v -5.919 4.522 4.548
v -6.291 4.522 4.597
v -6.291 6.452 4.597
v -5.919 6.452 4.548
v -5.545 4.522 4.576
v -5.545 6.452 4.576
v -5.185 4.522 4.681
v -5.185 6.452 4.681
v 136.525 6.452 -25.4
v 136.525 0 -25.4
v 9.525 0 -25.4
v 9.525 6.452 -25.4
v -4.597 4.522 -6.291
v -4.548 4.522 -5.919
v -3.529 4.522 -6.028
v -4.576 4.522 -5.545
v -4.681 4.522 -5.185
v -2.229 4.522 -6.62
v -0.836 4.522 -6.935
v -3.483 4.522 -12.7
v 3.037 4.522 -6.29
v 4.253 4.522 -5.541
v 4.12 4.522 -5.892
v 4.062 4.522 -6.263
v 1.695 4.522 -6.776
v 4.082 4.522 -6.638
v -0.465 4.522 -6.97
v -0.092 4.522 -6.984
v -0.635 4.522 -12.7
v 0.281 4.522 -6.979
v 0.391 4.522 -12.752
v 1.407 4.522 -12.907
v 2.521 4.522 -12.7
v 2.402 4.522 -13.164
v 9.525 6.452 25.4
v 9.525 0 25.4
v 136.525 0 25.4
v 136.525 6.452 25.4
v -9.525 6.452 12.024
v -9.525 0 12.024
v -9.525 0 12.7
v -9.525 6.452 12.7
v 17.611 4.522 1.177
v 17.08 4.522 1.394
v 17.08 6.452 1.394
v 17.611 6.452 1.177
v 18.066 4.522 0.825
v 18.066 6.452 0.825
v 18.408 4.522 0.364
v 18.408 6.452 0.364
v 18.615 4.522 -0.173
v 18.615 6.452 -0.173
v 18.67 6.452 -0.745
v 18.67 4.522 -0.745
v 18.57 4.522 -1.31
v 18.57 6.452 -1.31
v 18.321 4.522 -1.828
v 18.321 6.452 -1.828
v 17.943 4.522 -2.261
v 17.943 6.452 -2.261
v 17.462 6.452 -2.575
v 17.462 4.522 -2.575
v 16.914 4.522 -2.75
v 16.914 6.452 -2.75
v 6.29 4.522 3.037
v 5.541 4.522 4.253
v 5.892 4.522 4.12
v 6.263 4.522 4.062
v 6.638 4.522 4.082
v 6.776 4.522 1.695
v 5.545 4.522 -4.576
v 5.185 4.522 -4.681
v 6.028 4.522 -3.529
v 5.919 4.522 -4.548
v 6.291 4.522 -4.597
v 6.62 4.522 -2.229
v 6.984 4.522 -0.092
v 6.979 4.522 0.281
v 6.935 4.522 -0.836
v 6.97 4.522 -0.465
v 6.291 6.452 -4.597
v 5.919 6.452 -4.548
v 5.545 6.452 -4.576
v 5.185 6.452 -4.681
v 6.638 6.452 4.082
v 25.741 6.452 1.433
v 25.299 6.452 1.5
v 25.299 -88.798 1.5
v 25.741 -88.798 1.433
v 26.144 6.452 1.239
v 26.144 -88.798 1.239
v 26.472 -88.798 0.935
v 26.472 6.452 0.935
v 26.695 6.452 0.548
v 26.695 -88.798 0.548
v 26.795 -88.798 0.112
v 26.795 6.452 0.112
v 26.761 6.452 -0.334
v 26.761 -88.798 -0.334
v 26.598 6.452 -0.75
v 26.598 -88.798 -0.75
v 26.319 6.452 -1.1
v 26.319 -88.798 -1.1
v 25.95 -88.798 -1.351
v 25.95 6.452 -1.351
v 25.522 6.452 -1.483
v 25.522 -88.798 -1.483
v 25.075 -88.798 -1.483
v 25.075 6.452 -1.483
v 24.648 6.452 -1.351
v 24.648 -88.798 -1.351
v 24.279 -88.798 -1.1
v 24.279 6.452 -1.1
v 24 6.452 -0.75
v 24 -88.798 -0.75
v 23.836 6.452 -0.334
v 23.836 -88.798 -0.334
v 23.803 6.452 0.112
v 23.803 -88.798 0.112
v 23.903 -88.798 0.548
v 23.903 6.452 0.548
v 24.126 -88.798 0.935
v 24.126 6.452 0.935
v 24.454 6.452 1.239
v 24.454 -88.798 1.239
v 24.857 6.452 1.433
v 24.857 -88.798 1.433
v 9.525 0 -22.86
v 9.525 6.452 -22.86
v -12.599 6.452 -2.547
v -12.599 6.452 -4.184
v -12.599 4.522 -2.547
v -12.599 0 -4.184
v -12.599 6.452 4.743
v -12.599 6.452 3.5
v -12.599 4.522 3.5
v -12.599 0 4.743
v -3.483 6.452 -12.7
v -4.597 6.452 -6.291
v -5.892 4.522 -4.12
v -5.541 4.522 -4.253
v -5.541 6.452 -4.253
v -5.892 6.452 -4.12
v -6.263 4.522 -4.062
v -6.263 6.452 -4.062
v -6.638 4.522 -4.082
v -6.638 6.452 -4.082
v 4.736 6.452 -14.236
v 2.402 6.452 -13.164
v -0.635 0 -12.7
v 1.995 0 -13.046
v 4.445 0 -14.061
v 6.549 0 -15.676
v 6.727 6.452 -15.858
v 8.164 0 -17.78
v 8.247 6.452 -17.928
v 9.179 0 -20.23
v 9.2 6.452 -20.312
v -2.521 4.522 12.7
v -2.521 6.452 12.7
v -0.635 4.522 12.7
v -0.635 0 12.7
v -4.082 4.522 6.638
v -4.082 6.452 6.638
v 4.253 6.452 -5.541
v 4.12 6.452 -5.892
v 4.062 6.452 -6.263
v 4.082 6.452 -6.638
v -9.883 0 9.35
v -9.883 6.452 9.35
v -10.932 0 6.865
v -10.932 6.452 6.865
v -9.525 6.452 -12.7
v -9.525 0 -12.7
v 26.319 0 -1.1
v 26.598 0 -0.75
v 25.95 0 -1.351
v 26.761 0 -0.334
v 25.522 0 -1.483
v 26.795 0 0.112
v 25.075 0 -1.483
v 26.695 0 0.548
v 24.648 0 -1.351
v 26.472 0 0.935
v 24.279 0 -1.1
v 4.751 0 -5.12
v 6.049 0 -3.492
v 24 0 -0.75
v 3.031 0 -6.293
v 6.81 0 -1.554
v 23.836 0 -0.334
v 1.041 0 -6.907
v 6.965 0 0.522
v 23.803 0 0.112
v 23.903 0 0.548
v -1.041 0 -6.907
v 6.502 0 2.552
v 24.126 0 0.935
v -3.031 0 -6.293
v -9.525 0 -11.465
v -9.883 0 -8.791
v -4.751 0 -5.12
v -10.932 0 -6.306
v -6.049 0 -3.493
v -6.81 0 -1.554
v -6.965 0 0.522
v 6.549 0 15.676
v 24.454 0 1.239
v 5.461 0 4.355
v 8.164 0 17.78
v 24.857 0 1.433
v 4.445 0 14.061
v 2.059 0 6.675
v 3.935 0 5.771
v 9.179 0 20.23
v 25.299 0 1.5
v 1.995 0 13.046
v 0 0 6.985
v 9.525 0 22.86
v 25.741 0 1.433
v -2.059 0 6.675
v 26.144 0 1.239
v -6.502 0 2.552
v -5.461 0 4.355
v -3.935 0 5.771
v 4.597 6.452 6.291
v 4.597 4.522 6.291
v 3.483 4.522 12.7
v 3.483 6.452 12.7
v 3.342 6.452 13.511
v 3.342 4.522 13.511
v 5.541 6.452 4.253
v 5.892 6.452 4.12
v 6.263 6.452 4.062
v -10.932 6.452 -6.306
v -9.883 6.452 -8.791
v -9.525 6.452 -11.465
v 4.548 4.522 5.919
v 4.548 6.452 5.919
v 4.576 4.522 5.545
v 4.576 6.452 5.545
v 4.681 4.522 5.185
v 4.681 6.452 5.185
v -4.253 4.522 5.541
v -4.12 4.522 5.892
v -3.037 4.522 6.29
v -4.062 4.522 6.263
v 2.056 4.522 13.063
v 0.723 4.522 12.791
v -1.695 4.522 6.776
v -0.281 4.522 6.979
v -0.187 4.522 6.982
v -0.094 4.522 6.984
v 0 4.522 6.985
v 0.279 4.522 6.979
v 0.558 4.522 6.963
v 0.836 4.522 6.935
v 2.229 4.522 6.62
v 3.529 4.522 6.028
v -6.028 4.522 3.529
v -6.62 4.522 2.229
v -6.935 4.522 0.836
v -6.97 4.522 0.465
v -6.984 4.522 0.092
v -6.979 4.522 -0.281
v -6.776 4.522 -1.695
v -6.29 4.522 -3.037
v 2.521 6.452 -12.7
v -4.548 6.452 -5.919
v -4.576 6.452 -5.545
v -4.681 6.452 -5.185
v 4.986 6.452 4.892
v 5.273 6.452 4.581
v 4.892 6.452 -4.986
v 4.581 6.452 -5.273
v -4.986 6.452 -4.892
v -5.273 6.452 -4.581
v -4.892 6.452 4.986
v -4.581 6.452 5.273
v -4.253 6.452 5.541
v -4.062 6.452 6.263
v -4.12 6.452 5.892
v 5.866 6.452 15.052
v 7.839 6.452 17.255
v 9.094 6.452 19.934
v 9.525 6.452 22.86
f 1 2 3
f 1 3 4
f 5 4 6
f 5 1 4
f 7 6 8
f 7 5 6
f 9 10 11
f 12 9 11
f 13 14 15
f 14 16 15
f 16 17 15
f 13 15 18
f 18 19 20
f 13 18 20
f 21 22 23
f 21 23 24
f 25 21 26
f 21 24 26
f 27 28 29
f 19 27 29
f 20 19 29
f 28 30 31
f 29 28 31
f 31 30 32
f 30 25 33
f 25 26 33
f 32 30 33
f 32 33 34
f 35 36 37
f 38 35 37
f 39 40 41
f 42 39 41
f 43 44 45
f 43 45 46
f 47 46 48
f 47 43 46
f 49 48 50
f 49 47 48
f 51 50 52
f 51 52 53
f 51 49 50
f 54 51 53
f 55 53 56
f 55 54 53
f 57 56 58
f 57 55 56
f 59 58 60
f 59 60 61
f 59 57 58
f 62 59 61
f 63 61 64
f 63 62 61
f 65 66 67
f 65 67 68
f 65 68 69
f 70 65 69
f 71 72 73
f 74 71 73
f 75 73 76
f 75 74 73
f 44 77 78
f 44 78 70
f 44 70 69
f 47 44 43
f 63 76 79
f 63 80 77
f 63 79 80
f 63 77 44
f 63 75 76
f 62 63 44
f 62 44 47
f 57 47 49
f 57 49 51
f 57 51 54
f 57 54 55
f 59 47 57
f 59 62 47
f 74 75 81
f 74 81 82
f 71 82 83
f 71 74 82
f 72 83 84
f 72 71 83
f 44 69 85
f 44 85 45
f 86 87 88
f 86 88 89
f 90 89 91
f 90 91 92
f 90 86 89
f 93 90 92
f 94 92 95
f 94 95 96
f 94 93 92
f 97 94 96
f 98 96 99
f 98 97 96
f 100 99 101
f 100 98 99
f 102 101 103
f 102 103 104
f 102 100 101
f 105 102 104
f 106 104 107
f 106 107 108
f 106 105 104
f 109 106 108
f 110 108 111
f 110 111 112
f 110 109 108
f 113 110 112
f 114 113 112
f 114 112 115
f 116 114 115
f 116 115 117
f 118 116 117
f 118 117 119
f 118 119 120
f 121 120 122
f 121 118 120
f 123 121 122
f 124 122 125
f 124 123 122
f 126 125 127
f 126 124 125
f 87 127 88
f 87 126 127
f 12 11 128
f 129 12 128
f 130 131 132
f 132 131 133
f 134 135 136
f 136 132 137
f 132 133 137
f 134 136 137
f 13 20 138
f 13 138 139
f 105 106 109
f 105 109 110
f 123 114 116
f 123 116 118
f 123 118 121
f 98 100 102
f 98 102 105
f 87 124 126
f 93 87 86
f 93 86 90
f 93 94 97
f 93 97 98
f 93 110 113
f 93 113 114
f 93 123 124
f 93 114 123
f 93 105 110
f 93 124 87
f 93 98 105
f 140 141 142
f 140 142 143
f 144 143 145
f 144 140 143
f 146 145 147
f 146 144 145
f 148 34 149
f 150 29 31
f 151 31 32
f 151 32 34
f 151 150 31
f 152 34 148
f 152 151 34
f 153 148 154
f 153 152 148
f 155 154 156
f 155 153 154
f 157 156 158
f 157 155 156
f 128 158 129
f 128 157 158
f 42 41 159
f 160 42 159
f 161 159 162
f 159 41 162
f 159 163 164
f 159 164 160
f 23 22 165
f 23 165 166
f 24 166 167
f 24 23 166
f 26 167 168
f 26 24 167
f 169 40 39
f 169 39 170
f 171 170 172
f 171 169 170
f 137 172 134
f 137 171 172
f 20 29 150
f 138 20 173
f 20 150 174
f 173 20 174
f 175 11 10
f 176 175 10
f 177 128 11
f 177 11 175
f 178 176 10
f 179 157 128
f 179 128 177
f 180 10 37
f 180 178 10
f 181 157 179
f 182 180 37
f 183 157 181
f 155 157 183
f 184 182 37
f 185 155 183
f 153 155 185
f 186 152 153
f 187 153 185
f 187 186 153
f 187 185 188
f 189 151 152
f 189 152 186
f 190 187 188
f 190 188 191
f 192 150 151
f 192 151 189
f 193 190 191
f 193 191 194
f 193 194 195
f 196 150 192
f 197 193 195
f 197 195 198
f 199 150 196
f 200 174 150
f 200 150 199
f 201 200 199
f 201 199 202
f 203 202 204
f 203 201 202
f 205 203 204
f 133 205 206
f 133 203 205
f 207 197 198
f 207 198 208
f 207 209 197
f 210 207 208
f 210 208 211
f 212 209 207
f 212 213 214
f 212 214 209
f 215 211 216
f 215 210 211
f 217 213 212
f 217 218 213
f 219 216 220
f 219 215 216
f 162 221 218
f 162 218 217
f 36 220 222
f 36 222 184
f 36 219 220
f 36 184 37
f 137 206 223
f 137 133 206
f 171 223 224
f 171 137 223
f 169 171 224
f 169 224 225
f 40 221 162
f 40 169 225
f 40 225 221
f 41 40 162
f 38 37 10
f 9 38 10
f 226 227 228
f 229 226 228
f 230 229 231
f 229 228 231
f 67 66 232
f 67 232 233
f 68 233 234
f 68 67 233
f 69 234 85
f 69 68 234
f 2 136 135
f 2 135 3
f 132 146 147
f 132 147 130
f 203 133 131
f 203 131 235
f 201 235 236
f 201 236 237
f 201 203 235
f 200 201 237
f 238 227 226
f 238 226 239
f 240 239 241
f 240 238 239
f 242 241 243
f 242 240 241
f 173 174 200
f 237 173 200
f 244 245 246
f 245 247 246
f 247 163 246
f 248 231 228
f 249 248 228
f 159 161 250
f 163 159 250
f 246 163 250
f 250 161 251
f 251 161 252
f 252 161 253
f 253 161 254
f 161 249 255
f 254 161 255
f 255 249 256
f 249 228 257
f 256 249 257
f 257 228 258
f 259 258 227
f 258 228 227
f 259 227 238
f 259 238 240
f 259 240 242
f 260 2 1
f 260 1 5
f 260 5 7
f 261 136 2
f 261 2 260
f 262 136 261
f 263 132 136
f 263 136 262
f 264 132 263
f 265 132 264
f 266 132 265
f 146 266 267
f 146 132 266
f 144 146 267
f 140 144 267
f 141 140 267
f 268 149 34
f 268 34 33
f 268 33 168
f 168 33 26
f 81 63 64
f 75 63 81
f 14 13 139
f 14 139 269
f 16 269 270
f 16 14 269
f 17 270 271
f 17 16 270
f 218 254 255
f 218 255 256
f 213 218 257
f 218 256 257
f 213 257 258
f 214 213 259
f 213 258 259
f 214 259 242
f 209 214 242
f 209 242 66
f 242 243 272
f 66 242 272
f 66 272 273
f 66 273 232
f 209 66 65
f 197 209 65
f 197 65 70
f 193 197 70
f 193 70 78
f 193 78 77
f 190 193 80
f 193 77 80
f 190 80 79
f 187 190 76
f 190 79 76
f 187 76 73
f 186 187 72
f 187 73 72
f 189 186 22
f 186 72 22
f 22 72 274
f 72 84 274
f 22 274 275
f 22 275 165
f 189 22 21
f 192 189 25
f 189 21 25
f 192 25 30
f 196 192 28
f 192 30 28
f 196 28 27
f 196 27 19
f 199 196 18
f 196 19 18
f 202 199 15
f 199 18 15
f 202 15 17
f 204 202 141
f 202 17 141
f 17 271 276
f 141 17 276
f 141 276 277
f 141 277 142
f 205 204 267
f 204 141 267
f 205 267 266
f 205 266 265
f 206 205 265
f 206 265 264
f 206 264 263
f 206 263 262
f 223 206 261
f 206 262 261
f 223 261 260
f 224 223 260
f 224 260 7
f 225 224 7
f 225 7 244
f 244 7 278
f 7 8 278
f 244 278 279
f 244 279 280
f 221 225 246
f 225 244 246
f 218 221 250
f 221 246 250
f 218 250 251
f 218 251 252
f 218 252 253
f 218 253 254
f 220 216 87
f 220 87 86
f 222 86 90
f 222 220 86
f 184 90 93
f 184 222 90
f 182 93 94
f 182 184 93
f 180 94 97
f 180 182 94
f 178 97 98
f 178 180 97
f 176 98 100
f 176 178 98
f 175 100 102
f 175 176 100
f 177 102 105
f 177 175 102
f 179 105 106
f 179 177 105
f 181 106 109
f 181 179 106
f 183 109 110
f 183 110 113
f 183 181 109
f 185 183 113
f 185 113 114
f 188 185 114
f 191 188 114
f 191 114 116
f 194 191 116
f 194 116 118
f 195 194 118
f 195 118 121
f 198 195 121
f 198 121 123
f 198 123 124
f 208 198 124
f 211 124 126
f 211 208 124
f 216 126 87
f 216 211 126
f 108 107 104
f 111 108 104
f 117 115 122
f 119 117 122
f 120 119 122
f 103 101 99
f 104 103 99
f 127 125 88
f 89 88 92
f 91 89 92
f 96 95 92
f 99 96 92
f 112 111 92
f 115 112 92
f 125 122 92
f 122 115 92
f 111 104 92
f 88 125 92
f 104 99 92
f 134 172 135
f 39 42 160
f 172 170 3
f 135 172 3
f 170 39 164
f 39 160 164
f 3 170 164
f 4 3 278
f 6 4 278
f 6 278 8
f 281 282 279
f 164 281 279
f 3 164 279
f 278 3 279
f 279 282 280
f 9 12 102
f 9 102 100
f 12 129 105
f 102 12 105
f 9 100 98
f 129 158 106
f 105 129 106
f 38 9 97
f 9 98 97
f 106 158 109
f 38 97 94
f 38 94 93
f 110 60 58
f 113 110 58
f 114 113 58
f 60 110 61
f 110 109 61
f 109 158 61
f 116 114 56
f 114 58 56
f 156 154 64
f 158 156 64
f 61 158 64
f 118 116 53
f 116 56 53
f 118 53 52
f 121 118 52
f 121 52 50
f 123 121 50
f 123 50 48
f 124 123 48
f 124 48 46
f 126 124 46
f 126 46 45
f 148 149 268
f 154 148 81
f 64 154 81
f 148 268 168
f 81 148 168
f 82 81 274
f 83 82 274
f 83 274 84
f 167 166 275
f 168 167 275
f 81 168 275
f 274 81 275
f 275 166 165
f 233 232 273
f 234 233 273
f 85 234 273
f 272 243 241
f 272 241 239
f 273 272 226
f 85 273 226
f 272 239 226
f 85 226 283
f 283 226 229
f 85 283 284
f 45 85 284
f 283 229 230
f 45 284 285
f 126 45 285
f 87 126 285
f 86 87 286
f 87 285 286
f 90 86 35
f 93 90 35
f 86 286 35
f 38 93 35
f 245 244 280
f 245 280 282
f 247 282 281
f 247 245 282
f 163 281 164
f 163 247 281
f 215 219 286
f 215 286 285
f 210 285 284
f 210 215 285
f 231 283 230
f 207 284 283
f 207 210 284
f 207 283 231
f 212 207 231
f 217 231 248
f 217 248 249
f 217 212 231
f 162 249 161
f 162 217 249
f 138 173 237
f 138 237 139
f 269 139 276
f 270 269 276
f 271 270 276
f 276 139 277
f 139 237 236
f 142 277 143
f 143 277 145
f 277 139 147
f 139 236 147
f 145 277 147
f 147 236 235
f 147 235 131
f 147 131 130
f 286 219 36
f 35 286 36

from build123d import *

# Parameters (mm, degrees)
SKETCH1_R           = 1.5
BOSS_EXTRUDE1_DEPTH = 6.4516
SKETCH2_3_R         = 6.985
CUT_EXTRUDE2_DEPTH  = 19.97964
CAVITY1_START       = 4.521642996
CAVITY1_OUTLINE_R   = 0.7575
CAVITY1_DEPTH       = 1.929957004
SKETCH3_R           = 0.7575
CUT_EXTRUDE3_DEPTH  = 139.94128573
SKETCH4_R           = 1.5
BOSS_EXTRUDE2_DEPTH = 95.25
FILLET1_R           = 10.16


with BuildPart() as part:
    # Sketch1 → Boss-Extrude1 (new body)
    with BuildSketch(Plane(origin=(0, 0, 0), x_dir=(1, 0, 0), z_dir=(0, 1, 0))):
        Polygon((-12.598868717, 4.18434255), (-12.598868717, -4.742883604), (-9.525, -5.534097084), (-9.525, -12.7), (9.525, -12.7), (9.525, -25.4), (136.525, -25.4), (136.525, 25.4), (9.525, 25.4), (9.525, 12.7), (-9.525, 12.7), (-9.525, 4.975556031), align=None)
        with Locations(Location((25.298868717, 0, 0), (0, 0, 270))):
            Circle(SKETCH1_R, mode=Mode.SUBTRACT)
    extrude(amount=BOSS_EXTRUDE1_DEPTH)

    # Sketch2<3> → Cut-Extrude2 (cut)
    with BuildSketch(Plane(origin=(0, 6.4516, 0), x_dir=(1, 0, 0), z_dir=(0, 1, 0))):
        with Locations(Location((0, 0, 0), (0, 0, 270))):
            Circle(SKETCH2_3_R)
    extrude(amount=-CUT_EXTRUDE2_DEPTH, mode=Mode.SUBTRACT)

    # Cavity1: read off the stored shape, not the designer's step
    # Cavity1 outline → Cavity1 (cut)
    # profile 1 of 4: a face of its own
    with BuildSketch(Plane(origin=(0, 0, 0), x_dir=(1, 0, 0), z_dir=(0, 1, 0)).offset(CAVITY1_START)):
        with BuildLine():
            ThreePointArc((-0.835841276, 6.934810333), (-0.328024221, 8.224961542), (0.280923041, 6.979348626))
            ThreePointArc((0.280923041, 6.979348626), (2.378348231, 6.567623976), (4.253065237, 5.540907966))
            ThreePointArc((4.253065237, 5.540907966), (4.081154126, 6.075770836), (4.081735433, 6.637581642))
            Line((4.081735433, 6.637581642), (2.521269592, 12.7))
            Line((2.521269592, 12.7), (-3.482705917, 12.7))
            Line((-3.482705917, 12.7), (-4.59736509, 6.291445655))
            ThreePointArc((-4.59736509, 6.291445655), (-4.552045019, 5.731465467), (-4.680815563, 5.184610947))
            ThreePointArc((-4.680815563, 5.184610947), (-2.893816709, 6.357361863), (-0.835841276, 6.934810333))
        make_face()
        with Locations((-0.418583054, 10.495656446)):
            Circle(CAVITY1_OUTLINE_R, mode=Mode.SUBTRACT)
    # profile 2 of 4: a face of its own
    with BuildSketch(Plane(origin=(0, 0, 0), x_dir=(1, 0, 0), z_dir=(0, 1, 0)).offset(CAVITY1_START)):
        with BuildLine():
            ThreePointArc((6.291445655, 4.59736509), (5.731465467, 4.552045019), (5.184610947, 4.680815563))
            ThreePointArc((5.184610947, 4.680815563), (6.357361863, 2.893816709), (6.934810333, 0.835841276))
            ThreePointArc((6.934810333, 0.835841276), (8.224961542, 0.328024221), (6.979348626, -0.280923041))
            ThreePointArc((6.979348626, -0.280923041), (6.567623976, -2.378348231), (5.540907966, -4.253065237))
            ThreePointArc((5.540907966, -4.253065237), (6.075770836, -4.081154126), (6.637581642, -4.081735433))
            Line((6.637581642, -4.081735433), (17.079554107, -1.39397283))
            ThreePointArc((17.079554107, -1.39397283), (18.670158101, 0.744594857), (16.914297994, 2.749700365))
            Line((16.914297994, 2.749700365), (6.291445655, 4.59736509))
        make_face()
        with Locations((10.495656446, 0.418583054)):
            Circle(CAVITY1_OUTLINE_R, mode=Mode.SUBTRACT)
        with Locations((13.523249651, 0.539328166)):
            Circle(CAVITY1_OUTLINE_R, mode=Mode.SUBTRACT)
        with Locations((16.550842857, 0.660073278)):
            Circle(CAVITY1_OUTLINE_R, mode=Mode.SUBTRACT)
    # profile 3 of 4: a face of its own
    with BuildSketch(Plane(origin=(0, 0, 0), x_dir=(1, 0, 0), z_dir=(0, 1, 0)).offset(CAVITY1_START)):
        with BuildLine():
            ThreePointArc((-6.979348626, 0.280923041), (-6.567623976, 2.378348231), (-5.540907966, 4.253065237))
            ThreePointArc((-5.540907966, 4.253065237), (-6.075770836, 4.081154126), (-6.637581642, 4.081735433))
            Line((-6.637581642, 4.081735433), (-12.598868717, 2.547300773))
            Line((-12.598868717, 2.547300773), (-12.598868717, -3.500295986))
            Line((-12.598868717, -3.500295986), (-6.291445655, -4.59736509))
            ThreePointArc((-6.291445655, -4.59736509), (-5.731465467, -4.552045019), (-5.184610947, -4.680815563))
            ThreePointArc((-5.184610947, -4.680815563), (-6.357361863, -2.893816709), (-6.934810333, -0.835841276))
            ThreePointArc((-6.934810333, -0.835841276), (-8.224961542, -0.328024221), (-6.979348626, 0.280923041))
        make_face()
        with Locations((-10.495656446, -0.418583054)):
            Circle(CAVITY1_OUTLINE_R, mode=Mode.SUBTRACT)
    # profile 4 of 4: a face of its own
    with BuildSketch(Plane(origin=(0, 0, 0), x_dir=(1, 0, 0), z_dir=(0, 1, 0)).offset(CAVITY1_START)):
        with BuildLine():
            ThreePointArc((4.59736509, -6.291445655), (4.552045019, -5.731465467), (4.680815563, -5.184610947))
            ThreePointArc((4.680815563, -5.184610947), (2.893816709, -6.357361863), (0.835841276, -6.934810333))
            ThreePointArc((0.835841276, -6.934810333), (0.328024221, -8.224961542), (-0.280923041, -6.979348626))
            ThreePointArc((-0.280923041, -6.979348626), (-2.378348231, -6.567623976), (-4.253065237, -5.540907966))
            ThreePointArc((-4.253065237, -5.540907966), (-4.081154126, -6.075770836), (-4.081735433, -6.637581642))
            Line((-4.081735433, -6.637581642), (-2.521269592, -12.7))
            Line((-2.521269592, -12.7), (3.482705917, -12.7))
            Line((3.482705917, -12.7), (4.59736509, -6.291445655))
        make_face()
        with Locations((0.418583054, -10.495656446)):
            Circle(CAVITY1_OUTLINE_R, mode=Mode.SUBTRACT)
    extrude(amount=CAVITY1_DEPTH, mode=Mode.SUBTRACT)

    # Sketch3 → Cut-Extrude3 (cut, through all)
    with BuildSketch(Plane(origin=(0, 4.521642996, 0), x_dir=(1, 0, 0), z_dir=(0, 1, 0))):
        with Locations((0.418583054, -10.495656446)):
            Circle(SKETCH3_R)
        with Locations((16.550842857, 0.660073278)):
            Circle(SKETCH3_R)
        with Locations((13.523249651, 0.539328166)):
            Circle(SKETCH3_R)
        with Locations((10.495656446, 0.418583054)):
            Circle(SKETCH3_R)
        with Locations((-0.418583054, 10.495656446)):
            Circle(SKETCH3_R)
        with Locations((-10.495656446, -0.418583054)):
            Circle(SKETCH3_R)
        with BuildLine():
            Line((-6.979348626, 0.280923041), (-6.934810333, -0.835841276))
            ThreePointArc((-6.934810333, -0.835841276), (-8.224961542, -0.32802422), (-6.979348626, 0.280923041))
        make_face()
        with BuildLine():
            Line((-0.835841276, 6.934810333), (0.280923041, 6.979348626))
            ThreePointArc((0.280923041, 6.979348626), (-0.32802422, 8.224961542), (-0.835841276, 6.934810333))
        make_face()
        with BuildLine():
            Line((6.934810333, 0.835841276), (6.979348626, -0.280923041))
            ThreePointArc((6.979348626, -0.280923041), (8.224961542, 0.32802422), (6.934810333, 0.835841276))
        make_face()
        with BuildLine():
            Line((-0.280923041, -6.979348626), (0.835841276, -6.934810333))
            ThreePointArc((0.835841276, -6.934810333), (0.32802422, -8.224961542), (-0.280923041, -6.979348626))
        make_face()
    extrude(amount=CUT_EXTRUDE3_DEPTH, mode=Mode.SUBTRACT)

    # Fillet1
    # the kernel refuses this fillet: 10.16 mm, written as the material it adds along each edge
    with BuildSketch(Plane(origin=(-9.525, 0, -4.975556031), x_dir=(0, 0, -1), z_dir=(0, 1, 0))) as fillet1_piece_1:
        with BuildLine():
            CenterArc((6.48974411, 10.16), FILLET1_R, 224.223082624, 45.776917376)
            Line((-0.791213481, 3.073868717), (0, 0))
            Line((0, 0), (6.48974411, 0))
        make_face()
    extrude(amount=6.4516)
    with BuildSketch(Plane(origin=(-9.525, 0, 5.534097084), x_dir=(0, 0, 1), z_dir=(0, 1, 0))) as fillet1_piece_2:
        with BuildLine():
            CenterArc((6.48974411, -10.16), FILLET1_R, 90, 45.776917376)
            Line((-0.791213481, -3.073868717), (0, 0))
            Line((0, 0), (6.48974411, 0))
        make_face()
    extrude(amount=6.4516)
    with BuildSketch(Plane(origin=(9.525, 0, 12.7), x_dir=(0, 0, 1), z_dir=(0, 1, 0))) as fillet1_piece_3_section:
        with BuildLine():
            CenterArc((FILLET1_R, -FILLET1_R), FILLET1_R, 90, 90)
            Line((0, -FILLET1_R), (0, 0))
            Line((0, 0), (FILLET1_R, 0))
        make_face()
    fillet1_piece_3 = extrude(amount=6.4516, mode=Mode.PRIVATE)
    fillet1_piece_3 = split(fillet1_piece_3, bisect_by=Plane(origin=(3.660133912, 0, 11.679906164), z_dir=(0.9852084333186758, 0, 0.17136027228549955)), keep=Keep.TOP, mode=Mode.PRIVATE)
    fillet1_piece_3 = split(fillet1_piece_3, bisect_by=Plane(origin=(9.525, 4.521642996, 12.7), z_dir=(0, -1, 0)), keep=Keep.TOP, mode=Mode.PRIVATE)
    add(fillet1_piece_3)
    with BuildSketch(Plane(origin=(9.525, 0, 12.7), x_dir=(0, 0, 1), z_dir=(0, 1, 0))) as fillet1_piece_4_section:
        with BuildLine():
            CenterArc((FILLET1_R, -FILLET1_R), FILLET1_R, 90, 90)
            Line((0, -FILLET1_R), (0, 0))
            Line((0, 0), (FILLET1_R, 0))
        make_face()
    fillet1_piece_4 = extrude(amount=6.4516, mode=Mode.PRIVATE)
    fillet1_piece_4 = split(fillet1_piece_4, bisect_by=Plane(origin=(3.660133912, 0, 11.679906164), z_dir=(-0.9852084333186758, 0, -0.17136027228549955)), keep=Keep.TOP, mode=Mode.PRIVATE)
    fillet1_piece_4 = split(fillet1_piece_4, bisect_by=Plane(origin=(9.525, 4.521642996, 12.7), z_dir=(0, -1, 0)), keep=Keep.TOP, mode=Mode.PRIVATE)
    add(fillet1_piece_4)
    with BuildSketch(Plane(origin=(9.525, 0, 12.7), x_dir=(0, 0, 1), z_dir=(0, 1, 0))) as fillet1_piece_5_section:
        with BuildLine():
            CenterArc((FILLET1_R, -FILLET1_R), FILLET1_R, 90, 90)
            Line((0, -FILLET1_R), (0, 0))
            Line((0, 0), (FILLET1_R, 0))
        make_face()
    fillet1_piece_5 = extrude(amount=6.4516, mode=Mode.PRIVATE)
    fillet1_piece_5 = split(fillet1_piece_5, bisect_by=Plane(origin=(3.660133912, 0, 11.679906164), z_dir=(0.9852084333186758, 0, 0.17136027228549955)), keep=Keep.TOP, mode=Mode.PRIVATE)
    fillet1_piece_5 = split(fillet1_piece_5, bisect_by=Plane(origin=(9.525, 4.521642996, 12.7), z_dir=(0, 1, 0)), keep=Keep.TOP, mode=Mode.PRIVATE)
    add(fillet1_piece_5)
    with BuildSketch(Plane(origin=(9.525, 0, -12.7), x_dir=(0, 0, -1), z_dir=(0, 1, 0))) as fillet1_piece_6_section:
        with BuildLine():
            CenterArc((FILLET1_R, FILLET1_R), FILLET1_R, 180, 90)
            Line((0, FILLET1_R), (0, 0))
            Line((0, 0), (FILLET1_R, 0))
        make_face()
    fillet1_piece_6 = extrude(amount=6.4516, mode=Mode.PRIVATE)
    fillet1_piece_6 = split(fillet1_piece_6, bisect_by=Plane(origin=(9.525, 4.521642996, -12.7), z_dir=(0, -1, 0)), keep=Keep.TOP, mode=Mode.PRIVATE)
    fillet1_piece_6 = split(fillet1_piece_6, bisect_by=Plane(origin=(2.956465884, 0, -11.009260017), z_dir=(0.9684328656786102, 0, -0.24927451669497816)), keep=Keep.TOP, mode=Mode.PRIVATE)
    add(fillet1_piece_6)
    with BuildSketch(Plane(origin=(9.525, 0, -12.7), x_dir=(0, 0, -1), z_dir=(0, 1, 0))) as fillet1_piece_7_section:
        with BuildLine():
            CenterArc((FILLET1_R, FILLET1_R), FILLET1_R, 180, 90)
            Line((0, FILLET1_R), (0, 0))
            Line((0, 0), (FILLET1_R, 0))
        make_face()
    fillet1_piece_7 = extrude(amount=6.4516, mode=Mode.PRIVATE)
    fillet1_piece_7 = split(fillet1_piece_7, bisect_by=Plane(origin=(9.525, 4.521642996, -12.7), z_dir=(0, -1, 0)), keep=Keep.TOP, mode=Mode.PRIVATE)
    fillet1_piece_7 = split(fillet1_piece_7, bisect_by=Plane(origin=(2.956465884, 0, -11.009260017), z_dir=(-0.9684328656786102, 0, 0.24927451669497816)), keep=Keep.TOP, mode=Mode.PRIVATE)
    add(fillet1_piece_7)
    with BuildSketch(Plane(origin=(9.525, 0, -12.7), x_dir=(0, 0, -1), z_dir=(0, 1, 0))) as fillet1_piece_8_section:
        with BuildLine():
            CenterArc((FILLET1_R, FILLET1_R), FILLET1_R, 180, 90)
            Line((0, FILLET1_R), (0, 0))
            Line((0, 0), (FILLET1_R, 0))
        make_face()
    fillet1_piece_8 = extrude(amount=6.4516, mode=Mode.PRIVATE)
    fillet1_piece_8 = split(fillet1_piece_8, bisect_by=Plane(origin=(9.525, 4.521642996, -12.7), z_dir=(0, 1, 0)), keep=Keep.TOP, mode=Mode.PRIVATE)
    fillet1_piece_8 = split(fillet1_piece_8, bisect_by=Plane(origin=(2.956465884, 0, -11.009260017), z_dir=(0.9684328656786102, 0, -0.24927451669497816)), keep=Keep.TOP, mode=Mode.PRIVATE)
    add(fillet1_piece_8)


with BuildPart() as body_2:
    # Sketch4 → Boss-Extrude2 (new body)
    with BuildSketch(Plane(origin=(0, 6.4516, 0), x_dir=(1, 0, 0), z_dir=(0, 1, 0))):
        with Locations(Location((25.298868717, 0, 0), (0, 0, 270))):
            Circle(SKETCH4_R)
    extrude(amount=-BOSS_EXTRUDE2_DEPTH)


solid = Compound([part.part, body_2.part])
